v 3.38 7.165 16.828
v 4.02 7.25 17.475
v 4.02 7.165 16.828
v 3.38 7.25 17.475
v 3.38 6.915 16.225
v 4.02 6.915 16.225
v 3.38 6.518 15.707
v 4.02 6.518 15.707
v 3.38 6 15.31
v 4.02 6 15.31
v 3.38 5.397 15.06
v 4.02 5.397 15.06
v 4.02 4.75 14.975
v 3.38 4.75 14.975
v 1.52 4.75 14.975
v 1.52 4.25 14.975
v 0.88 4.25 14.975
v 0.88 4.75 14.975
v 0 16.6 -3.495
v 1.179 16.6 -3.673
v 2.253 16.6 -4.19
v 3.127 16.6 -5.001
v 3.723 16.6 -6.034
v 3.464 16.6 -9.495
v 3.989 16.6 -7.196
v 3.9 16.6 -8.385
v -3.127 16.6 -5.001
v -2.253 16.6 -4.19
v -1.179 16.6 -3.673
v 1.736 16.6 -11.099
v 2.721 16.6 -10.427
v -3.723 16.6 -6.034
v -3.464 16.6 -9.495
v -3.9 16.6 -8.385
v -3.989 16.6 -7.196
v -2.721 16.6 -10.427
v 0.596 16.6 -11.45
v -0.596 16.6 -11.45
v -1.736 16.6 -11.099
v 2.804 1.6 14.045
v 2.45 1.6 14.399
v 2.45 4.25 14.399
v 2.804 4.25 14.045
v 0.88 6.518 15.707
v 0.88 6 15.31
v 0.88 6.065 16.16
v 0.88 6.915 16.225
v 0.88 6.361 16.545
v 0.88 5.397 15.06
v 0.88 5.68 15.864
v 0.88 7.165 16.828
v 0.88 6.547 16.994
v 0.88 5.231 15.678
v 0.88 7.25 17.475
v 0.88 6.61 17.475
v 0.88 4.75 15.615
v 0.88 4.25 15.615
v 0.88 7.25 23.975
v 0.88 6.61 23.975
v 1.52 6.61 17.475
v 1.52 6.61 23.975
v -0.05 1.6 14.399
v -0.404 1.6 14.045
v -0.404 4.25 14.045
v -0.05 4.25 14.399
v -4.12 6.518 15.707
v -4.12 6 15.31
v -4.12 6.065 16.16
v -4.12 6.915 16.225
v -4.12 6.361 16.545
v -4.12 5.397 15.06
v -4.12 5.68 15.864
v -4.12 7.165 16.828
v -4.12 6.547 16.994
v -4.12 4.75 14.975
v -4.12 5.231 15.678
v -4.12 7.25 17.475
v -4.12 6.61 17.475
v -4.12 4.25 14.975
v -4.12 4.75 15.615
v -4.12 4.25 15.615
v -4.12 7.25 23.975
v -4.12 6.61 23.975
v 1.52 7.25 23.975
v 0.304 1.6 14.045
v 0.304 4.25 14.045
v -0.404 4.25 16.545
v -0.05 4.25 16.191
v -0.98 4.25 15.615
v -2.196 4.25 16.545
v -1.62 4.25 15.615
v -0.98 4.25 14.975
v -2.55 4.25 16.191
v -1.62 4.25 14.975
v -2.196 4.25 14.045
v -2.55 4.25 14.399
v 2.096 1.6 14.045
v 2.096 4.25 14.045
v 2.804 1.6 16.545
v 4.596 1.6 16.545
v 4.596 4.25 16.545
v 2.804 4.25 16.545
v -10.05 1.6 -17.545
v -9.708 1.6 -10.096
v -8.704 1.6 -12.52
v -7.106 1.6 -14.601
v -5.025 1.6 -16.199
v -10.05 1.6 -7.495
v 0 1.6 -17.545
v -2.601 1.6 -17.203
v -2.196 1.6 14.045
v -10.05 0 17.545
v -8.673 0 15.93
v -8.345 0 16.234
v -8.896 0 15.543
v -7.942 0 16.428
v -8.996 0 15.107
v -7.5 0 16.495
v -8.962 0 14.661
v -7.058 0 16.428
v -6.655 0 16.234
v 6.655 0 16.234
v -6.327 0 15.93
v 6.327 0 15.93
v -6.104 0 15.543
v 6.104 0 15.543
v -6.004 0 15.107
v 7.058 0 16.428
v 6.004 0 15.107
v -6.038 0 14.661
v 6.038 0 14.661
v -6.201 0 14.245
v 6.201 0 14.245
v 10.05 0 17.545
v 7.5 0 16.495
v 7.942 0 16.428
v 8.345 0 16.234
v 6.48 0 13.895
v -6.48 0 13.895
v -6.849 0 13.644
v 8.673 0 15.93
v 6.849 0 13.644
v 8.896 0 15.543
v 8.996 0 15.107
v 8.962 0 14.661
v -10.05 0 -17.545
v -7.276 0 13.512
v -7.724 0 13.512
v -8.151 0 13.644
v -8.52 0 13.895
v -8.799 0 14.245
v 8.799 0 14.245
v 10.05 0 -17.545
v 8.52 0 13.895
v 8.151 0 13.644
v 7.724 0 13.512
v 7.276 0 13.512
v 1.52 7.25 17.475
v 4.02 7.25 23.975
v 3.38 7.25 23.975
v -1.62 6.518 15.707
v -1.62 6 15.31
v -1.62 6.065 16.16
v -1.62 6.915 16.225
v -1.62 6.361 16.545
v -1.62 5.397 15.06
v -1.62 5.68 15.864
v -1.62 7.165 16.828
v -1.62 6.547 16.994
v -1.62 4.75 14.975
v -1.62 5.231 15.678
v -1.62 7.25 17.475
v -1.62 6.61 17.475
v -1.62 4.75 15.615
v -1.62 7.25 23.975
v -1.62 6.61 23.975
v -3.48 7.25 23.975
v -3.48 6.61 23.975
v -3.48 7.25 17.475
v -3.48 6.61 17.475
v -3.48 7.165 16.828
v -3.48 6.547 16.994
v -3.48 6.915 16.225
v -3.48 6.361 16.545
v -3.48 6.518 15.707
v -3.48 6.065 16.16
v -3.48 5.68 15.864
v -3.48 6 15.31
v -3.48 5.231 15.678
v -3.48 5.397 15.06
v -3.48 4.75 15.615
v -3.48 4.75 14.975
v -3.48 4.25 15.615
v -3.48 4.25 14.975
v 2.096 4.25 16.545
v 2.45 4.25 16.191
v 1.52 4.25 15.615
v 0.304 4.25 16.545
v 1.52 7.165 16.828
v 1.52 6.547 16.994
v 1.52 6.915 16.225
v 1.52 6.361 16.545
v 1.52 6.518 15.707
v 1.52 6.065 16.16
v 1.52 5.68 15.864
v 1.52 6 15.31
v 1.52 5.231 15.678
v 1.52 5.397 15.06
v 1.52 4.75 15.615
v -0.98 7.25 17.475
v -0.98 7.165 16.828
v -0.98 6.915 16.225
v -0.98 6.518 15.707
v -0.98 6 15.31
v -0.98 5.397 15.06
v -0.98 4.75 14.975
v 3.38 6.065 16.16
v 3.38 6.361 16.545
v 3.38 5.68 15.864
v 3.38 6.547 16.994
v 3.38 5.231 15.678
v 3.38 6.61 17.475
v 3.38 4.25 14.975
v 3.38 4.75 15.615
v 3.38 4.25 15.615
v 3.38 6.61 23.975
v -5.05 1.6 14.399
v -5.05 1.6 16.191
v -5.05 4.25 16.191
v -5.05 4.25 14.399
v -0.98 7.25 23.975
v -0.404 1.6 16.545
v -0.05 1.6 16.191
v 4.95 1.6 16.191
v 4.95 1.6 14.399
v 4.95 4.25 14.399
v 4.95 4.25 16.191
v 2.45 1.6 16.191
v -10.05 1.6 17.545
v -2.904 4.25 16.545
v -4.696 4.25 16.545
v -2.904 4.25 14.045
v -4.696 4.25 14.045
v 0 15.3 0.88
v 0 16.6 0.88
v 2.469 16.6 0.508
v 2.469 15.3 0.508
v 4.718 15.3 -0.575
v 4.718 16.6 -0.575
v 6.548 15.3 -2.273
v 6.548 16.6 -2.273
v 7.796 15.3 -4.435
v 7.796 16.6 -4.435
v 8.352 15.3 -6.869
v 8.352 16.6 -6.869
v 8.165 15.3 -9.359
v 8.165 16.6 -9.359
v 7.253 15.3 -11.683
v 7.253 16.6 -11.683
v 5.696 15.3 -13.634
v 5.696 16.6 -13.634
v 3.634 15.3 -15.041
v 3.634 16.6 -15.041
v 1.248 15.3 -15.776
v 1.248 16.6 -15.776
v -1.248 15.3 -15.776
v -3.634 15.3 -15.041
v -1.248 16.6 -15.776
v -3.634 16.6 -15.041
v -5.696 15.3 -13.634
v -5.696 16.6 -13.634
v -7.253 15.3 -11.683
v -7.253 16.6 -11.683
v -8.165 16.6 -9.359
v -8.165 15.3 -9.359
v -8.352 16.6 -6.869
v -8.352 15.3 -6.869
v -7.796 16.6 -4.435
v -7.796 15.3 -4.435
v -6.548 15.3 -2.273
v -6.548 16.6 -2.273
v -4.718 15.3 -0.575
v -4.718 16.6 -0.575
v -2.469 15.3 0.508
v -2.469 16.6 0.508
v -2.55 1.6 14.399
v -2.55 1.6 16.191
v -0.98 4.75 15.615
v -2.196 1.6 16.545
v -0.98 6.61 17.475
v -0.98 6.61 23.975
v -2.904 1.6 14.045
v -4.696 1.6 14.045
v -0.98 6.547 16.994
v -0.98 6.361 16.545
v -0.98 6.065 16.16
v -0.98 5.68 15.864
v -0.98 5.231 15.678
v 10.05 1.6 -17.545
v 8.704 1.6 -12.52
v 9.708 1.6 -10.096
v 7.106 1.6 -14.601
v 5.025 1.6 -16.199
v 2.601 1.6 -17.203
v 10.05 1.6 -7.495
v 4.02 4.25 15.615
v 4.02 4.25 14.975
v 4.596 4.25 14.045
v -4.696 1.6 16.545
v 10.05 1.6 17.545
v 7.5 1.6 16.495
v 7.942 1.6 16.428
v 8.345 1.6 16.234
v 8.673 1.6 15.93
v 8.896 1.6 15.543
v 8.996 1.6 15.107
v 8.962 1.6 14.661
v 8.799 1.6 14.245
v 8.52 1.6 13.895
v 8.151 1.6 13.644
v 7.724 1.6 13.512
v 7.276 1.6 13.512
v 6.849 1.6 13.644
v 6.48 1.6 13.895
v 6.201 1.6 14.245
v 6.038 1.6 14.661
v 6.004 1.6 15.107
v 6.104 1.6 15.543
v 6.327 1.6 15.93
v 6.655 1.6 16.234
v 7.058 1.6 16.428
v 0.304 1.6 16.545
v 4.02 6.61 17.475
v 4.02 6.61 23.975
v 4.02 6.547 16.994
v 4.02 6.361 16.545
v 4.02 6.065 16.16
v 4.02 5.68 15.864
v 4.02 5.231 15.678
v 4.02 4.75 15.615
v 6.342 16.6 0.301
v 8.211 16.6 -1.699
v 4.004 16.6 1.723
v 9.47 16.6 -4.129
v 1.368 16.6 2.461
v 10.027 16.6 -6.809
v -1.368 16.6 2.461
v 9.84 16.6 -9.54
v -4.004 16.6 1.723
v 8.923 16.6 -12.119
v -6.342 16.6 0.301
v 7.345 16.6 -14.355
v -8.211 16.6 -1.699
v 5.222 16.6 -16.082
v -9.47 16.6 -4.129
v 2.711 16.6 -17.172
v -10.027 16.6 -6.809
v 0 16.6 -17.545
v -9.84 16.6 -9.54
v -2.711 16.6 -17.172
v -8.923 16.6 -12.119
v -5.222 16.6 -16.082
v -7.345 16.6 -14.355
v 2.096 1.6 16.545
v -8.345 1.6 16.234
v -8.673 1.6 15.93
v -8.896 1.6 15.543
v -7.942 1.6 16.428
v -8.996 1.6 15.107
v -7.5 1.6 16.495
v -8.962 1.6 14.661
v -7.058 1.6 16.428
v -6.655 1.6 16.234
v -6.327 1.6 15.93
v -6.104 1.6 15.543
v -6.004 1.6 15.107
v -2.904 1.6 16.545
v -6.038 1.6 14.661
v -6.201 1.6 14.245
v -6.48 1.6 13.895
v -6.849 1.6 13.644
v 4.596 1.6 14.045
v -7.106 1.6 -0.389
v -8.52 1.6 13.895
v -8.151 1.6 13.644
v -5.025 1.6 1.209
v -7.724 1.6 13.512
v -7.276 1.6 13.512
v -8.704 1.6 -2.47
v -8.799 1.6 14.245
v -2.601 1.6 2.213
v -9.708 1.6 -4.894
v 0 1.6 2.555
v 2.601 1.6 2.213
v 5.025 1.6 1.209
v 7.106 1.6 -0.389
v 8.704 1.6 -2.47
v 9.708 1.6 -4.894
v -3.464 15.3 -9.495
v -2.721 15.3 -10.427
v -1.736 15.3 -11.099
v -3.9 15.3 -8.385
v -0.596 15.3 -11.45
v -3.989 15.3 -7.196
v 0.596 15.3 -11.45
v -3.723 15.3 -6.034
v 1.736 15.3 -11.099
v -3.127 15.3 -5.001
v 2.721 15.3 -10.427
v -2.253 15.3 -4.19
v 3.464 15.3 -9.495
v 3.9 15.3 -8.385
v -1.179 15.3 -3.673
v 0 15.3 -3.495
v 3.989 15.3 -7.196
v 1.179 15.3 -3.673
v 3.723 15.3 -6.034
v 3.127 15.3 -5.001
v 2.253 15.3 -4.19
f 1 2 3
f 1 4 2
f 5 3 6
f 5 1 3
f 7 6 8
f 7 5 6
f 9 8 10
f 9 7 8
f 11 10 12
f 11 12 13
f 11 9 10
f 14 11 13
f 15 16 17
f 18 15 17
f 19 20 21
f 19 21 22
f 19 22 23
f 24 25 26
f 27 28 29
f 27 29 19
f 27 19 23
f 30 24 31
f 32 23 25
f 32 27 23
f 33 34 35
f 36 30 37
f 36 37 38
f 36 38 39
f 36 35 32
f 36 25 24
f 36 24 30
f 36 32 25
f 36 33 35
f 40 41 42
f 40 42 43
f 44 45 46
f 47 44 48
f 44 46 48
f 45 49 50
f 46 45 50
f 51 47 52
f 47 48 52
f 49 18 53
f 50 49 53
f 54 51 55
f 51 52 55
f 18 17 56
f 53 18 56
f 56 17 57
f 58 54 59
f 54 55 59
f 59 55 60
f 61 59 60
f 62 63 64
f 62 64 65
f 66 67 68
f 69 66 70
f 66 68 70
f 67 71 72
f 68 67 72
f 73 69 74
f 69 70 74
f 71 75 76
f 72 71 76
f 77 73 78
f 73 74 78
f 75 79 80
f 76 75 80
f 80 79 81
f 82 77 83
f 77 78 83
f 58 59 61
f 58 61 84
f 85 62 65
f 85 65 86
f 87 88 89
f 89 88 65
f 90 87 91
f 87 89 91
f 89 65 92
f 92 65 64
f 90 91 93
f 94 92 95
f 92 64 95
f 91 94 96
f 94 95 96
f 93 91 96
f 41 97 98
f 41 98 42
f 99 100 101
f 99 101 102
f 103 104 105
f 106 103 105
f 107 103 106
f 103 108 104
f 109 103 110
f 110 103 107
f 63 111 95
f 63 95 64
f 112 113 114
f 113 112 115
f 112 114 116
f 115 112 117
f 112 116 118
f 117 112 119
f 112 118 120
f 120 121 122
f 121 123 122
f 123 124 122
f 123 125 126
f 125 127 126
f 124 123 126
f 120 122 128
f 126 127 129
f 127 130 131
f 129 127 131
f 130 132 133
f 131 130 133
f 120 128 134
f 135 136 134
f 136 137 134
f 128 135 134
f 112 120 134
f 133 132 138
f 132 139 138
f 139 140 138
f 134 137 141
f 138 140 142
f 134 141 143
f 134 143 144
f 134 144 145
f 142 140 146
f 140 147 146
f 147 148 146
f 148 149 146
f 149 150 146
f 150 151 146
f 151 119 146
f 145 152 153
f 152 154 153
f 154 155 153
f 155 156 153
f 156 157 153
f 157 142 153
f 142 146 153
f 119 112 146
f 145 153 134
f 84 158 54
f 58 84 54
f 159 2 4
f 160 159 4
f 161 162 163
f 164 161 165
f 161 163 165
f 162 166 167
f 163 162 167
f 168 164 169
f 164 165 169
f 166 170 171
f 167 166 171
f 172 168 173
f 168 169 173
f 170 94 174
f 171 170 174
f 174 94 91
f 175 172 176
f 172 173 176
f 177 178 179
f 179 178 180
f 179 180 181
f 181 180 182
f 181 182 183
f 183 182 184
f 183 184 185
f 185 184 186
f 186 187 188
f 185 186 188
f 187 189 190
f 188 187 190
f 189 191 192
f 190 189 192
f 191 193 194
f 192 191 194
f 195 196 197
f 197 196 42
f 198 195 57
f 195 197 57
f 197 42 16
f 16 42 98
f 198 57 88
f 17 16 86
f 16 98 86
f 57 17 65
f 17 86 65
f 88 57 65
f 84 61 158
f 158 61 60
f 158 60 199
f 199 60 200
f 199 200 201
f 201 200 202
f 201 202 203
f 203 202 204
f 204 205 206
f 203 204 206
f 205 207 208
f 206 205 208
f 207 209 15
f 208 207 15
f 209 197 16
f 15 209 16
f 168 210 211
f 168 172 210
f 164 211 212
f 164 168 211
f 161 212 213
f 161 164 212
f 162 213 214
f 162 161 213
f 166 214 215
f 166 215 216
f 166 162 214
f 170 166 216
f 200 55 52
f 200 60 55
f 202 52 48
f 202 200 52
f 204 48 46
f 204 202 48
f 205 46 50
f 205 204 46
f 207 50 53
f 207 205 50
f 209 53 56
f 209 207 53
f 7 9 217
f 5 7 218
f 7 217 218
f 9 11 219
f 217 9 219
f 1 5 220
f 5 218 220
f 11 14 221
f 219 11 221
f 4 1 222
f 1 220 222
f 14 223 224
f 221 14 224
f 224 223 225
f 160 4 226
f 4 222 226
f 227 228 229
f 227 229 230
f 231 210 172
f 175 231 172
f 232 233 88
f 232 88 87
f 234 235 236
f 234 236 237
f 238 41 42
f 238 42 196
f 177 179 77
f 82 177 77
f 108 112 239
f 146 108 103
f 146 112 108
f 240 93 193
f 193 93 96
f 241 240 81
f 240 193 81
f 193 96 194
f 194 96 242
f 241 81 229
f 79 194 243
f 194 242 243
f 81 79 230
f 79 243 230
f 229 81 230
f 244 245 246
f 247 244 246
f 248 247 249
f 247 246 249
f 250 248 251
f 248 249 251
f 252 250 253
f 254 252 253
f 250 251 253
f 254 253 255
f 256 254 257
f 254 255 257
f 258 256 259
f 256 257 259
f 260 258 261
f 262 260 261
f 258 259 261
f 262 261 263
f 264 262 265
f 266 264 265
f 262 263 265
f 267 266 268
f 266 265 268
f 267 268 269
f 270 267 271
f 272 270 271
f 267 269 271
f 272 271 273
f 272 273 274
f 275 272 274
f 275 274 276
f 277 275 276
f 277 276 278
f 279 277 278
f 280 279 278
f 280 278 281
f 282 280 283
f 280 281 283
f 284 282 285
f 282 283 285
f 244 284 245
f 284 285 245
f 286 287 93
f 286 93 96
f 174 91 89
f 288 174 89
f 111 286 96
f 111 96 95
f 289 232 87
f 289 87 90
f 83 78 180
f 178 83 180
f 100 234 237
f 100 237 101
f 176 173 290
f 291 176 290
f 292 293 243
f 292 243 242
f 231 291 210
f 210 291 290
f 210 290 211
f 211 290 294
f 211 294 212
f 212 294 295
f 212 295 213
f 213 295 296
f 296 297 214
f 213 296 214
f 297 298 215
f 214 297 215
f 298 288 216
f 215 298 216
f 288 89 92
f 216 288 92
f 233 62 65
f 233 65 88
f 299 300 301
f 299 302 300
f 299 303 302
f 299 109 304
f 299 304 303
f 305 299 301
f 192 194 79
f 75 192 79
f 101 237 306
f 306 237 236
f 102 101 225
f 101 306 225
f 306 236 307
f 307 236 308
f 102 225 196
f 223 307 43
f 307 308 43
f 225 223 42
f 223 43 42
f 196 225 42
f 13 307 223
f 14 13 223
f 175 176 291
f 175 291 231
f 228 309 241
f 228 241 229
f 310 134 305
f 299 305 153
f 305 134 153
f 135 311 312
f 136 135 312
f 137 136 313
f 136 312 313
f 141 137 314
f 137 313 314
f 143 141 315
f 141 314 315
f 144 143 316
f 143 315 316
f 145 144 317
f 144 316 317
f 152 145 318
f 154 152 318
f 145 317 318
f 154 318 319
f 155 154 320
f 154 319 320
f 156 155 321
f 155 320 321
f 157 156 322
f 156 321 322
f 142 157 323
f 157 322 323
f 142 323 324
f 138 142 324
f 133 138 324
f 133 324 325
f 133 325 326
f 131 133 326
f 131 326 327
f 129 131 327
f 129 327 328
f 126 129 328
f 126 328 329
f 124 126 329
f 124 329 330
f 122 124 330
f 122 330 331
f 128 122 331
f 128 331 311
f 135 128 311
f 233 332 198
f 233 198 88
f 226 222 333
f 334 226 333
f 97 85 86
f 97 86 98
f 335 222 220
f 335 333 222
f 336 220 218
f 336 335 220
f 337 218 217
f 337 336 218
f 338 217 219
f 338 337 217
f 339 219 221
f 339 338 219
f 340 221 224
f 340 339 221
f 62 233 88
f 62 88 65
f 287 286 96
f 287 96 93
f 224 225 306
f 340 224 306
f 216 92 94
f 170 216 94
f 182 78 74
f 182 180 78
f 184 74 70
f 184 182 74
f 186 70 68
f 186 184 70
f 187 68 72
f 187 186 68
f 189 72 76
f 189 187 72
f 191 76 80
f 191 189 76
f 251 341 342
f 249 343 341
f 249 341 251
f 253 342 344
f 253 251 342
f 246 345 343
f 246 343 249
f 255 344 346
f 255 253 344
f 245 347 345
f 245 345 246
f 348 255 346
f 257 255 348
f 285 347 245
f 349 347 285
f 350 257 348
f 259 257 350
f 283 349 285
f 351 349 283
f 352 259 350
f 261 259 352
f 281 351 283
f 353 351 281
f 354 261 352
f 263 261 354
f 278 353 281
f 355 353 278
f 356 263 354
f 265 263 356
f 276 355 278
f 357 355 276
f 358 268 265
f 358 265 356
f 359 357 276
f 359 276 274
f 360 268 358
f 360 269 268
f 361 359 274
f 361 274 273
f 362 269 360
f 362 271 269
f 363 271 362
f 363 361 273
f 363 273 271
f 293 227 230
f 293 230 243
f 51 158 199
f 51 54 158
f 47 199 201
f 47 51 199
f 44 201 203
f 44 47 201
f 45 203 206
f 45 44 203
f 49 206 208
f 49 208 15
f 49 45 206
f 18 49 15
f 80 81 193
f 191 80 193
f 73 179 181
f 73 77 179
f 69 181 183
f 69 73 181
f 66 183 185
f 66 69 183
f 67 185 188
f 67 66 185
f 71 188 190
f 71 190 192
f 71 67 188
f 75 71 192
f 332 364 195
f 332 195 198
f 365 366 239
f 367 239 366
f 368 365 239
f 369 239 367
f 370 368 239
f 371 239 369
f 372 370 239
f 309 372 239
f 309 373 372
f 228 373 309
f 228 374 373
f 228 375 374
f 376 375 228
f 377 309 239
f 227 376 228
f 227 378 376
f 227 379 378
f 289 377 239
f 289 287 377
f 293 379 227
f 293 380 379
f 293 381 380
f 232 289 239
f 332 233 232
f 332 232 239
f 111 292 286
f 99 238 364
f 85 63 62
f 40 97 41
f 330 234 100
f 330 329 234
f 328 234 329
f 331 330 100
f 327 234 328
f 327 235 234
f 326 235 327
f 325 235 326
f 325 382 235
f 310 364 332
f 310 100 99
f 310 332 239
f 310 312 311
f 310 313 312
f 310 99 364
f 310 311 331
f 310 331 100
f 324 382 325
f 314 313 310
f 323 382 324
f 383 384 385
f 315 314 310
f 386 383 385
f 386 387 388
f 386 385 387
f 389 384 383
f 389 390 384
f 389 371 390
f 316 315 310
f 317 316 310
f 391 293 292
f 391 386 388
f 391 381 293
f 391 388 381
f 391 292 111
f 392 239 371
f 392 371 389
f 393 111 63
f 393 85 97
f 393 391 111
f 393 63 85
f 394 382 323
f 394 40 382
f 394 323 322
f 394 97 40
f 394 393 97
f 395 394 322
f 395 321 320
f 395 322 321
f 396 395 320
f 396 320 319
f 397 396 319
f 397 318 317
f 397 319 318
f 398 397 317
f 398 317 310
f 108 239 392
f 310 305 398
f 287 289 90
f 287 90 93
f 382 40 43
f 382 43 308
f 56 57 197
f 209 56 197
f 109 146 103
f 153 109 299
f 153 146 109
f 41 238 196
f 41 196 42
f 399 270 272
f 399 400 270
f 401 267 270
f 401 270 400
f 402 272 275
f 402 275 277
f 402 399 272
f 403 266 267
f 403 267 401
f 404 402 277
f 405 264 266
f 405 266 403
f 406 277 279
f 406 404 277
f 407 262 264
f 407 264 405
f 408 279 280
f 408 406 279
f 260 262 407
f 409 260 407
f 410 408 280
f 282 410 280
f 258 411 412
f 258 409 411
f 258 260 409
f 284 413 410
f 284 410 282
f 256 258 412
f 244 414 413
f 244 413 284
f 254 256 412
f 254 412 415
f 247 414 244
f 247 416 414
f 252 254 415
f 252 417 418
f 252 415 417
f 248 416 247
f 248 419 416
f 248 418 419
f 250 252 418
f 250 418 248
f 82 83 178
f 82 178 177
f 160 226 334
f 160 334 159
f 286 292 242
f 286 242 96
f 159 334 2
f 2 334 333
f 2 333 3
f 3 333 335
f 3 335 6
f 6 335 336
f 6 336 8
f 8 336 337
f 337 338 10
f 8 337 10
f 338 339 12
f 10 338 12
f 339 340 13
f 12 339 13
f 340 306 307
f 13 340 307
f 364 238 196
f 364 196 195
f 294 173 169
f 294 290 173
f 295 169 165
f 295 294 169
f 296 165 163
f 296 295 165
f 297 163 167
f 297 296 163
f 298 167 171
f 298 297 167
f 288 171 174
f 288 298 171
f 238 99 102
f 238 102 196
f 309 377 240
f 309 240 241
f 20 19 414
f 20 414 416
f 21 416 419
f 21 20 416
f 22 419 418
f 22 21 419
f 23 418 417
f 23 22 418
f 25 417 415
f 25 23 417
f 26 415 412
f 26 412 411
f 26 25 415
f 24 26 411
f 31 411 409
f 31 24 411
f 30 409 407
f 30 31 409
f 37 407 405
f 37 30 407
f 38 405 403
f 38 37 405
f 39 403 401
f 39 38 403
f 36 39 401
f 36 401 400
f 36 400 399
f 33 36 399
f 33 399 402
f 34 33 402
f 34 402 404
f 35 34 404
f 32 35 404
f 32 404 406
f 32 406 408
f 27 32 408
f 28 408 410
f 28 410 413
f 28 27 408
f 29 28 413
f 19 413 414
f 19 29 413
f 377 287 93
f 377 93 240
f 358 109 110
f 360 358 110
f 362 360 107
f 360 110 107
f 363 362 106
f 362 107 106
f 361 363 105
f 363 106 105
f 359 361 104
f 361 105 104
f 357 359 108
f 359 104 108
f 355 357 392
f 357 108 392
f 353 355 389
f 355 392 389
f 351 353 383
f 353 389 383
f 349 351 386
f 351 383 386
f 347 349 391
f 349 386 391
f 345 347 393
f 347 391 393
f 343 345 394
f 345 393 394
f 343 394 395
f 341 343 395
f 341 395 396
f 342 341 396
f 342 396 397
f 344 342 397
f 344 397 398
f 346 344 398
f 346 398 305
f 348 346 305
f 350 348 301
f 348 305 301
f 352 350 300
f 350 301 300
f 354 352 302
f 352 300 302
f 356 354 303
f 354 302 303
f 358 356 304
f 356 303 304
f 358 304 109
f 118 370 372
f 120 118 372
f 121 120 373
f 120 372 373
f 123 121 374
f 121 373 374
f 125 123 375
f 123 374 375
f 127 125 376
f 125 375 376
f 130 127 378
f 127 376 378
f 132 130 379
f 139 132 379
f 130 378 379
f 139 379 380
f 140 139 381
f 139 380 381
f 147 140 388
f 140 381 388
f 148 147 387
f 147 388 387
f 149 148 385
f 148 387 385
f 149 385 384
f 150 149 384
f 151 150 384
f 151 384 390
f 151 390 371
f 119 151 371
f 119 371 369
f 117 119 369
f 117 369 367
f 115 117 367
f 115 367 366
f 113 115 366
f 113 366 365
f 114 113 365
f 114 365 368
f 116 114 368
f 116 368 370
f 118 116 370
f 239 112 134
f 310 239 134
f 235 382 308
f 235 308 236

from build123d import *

# Parameters (mm, degrees)
SKETCH1_W           = 20.1
SKETCH1_H           = 35.09
BOSS_EXTRUDE1_DEPTH = 1.6
SKETCH2_R           = 10.05
BOSS_EXTRUDE2_DEPTH = 15
BOSS_EXTRUDE3_DEPTH = 2.65
SKETCH4_W           = 0.64
SKETCH4_H           = 0.64
LPATTERN1_COUNT     = 4
LPATTERN1_PITCH     = 2.5
SKETCH59_R          = 1.5
CUT_EXTRUDE1_DEPTH  = 31.013373788
SKETCH60_R          = 8.375
SKETCH60_R_2        = 4
CUT_EXTRUDE2_DEPTH  = 1.3


with BuildPart() as part:
    # Sketch1 → Boss-Extrude1 (new body)
    with BuildSketch(Plane(origin=(0, 0, 0), x_dir=(1, 0, 0), z_dir=(0, 1, 0))):
        Rectangle(SKETCH1_W, SKETCH1_H)
    extrude(amount=BOSS_EXTRUDE1_DEPTH)

    # Sketch2 → Boss-Extrude2 (add)
    with BuildSketch(Plane(origin=(0, 1.6, 0), x_dir=(1, 0, 0), z_dir=(0, 1, 0))):
        with Locations(Location((0, 7.495, 0), (0, 0, 90))):
            Circle(SKETCH2_R)
    extrude(amount=BOSS_EXTRUDE2_DEPTH)

    # Sketch3 → Boss-Extrude3 (add)
    with BuildSketch(Plane(origin=(0, 1.6, 0), x_dir=(1, 0, 0), z_dir=(0, 1, 0))):
        Polygon((-4.696446609, -14.045), (-2.903575031, -14.045), (-2.550043283, -14.398575031), (-2.550043283, -16.191446609), (-2.903596673, -16.545), (-4.696468251, -16.545), (-5.05, -16.191424969), (-5.05, -14.398553391), align=None)
    boss_extrude3 = extrude(amount=BOSS_EXTRUDE3_DEPTH)

    # Sweep1: sweep along a path in Sketch58
    with BuildLine(Plane.ZY.offset(3.800032462)) as sweep1_path:
        Line((23.97498918, 7.25), (17.47498918, 7.25))
        ThreePointArc((17.47498918, 7.25), (15.707222227, 6.517766953), (14.97498918, 4.75))
        Line((14.97498918, 4.75), (14.97498918, 4.25))
    # Sketch4 → Sweep1 (sweep)
    with BuildSketch(Plane(origin=(0, 4.25, 0), x_dir=(1, 0, 0), z_dir=(0, 1, 0))):
        with Locations((-3.800032462, -15.29498918)):
            Rectangle(SKETCH4_W, SKETCH4_H)
    sweep1 = sweep(path=sweep1_path.line)

    # LPattern1: Boss-Extrude3, Sweep1 ×4
    with Locations(*[(i * LPATTERN1_PITCH, 0, 0) for i in range(1, LPATTERN1_COUNT)]):
        add(boss_extrude3)
        add(sweep1)

    # Sketch59 → Cut-Extrude1 (cut, through all)
    with BuildSketch(Plane(origin=(0, 1.6, 0), x_dir=(1, 0, 0), z_dir=(0, 1, 0))):
        with Locations(Location((-7.5, -14.995, 0), (0, 0, 270))):
            Circle(SKETCH59_R)
        with Locations(Location((7.5, -14.995, 0), (0, 0, 270))):
            Circle(SKETCH59_R)
    extrude(amount=-CUT_EXTRUDE1_DEPTH, mode=Mode.SUBTRACT)

    # Sketch60 → Cut-Extrude2 (cut)
    with BuildSketch(Plane(origin=(0, 16.6, 0), x_dir=(1, 0, 0), z_dir=(0, 1, 0))):
        with Locations(Location((0, 7.495, 0), (0, 0, 270))):
            Circle(SKETCH60_R)
        with Locations(Location((0, 7.495, 0), (0, 0, 270))):
            Circle(SKETCH60_R_2, mode=Mode.SUBTRACT)
    extrude(amount=-CUT_EXTRUDE2_DEPTH, mode=Mode.SUBTRACT)


solid = part.part
